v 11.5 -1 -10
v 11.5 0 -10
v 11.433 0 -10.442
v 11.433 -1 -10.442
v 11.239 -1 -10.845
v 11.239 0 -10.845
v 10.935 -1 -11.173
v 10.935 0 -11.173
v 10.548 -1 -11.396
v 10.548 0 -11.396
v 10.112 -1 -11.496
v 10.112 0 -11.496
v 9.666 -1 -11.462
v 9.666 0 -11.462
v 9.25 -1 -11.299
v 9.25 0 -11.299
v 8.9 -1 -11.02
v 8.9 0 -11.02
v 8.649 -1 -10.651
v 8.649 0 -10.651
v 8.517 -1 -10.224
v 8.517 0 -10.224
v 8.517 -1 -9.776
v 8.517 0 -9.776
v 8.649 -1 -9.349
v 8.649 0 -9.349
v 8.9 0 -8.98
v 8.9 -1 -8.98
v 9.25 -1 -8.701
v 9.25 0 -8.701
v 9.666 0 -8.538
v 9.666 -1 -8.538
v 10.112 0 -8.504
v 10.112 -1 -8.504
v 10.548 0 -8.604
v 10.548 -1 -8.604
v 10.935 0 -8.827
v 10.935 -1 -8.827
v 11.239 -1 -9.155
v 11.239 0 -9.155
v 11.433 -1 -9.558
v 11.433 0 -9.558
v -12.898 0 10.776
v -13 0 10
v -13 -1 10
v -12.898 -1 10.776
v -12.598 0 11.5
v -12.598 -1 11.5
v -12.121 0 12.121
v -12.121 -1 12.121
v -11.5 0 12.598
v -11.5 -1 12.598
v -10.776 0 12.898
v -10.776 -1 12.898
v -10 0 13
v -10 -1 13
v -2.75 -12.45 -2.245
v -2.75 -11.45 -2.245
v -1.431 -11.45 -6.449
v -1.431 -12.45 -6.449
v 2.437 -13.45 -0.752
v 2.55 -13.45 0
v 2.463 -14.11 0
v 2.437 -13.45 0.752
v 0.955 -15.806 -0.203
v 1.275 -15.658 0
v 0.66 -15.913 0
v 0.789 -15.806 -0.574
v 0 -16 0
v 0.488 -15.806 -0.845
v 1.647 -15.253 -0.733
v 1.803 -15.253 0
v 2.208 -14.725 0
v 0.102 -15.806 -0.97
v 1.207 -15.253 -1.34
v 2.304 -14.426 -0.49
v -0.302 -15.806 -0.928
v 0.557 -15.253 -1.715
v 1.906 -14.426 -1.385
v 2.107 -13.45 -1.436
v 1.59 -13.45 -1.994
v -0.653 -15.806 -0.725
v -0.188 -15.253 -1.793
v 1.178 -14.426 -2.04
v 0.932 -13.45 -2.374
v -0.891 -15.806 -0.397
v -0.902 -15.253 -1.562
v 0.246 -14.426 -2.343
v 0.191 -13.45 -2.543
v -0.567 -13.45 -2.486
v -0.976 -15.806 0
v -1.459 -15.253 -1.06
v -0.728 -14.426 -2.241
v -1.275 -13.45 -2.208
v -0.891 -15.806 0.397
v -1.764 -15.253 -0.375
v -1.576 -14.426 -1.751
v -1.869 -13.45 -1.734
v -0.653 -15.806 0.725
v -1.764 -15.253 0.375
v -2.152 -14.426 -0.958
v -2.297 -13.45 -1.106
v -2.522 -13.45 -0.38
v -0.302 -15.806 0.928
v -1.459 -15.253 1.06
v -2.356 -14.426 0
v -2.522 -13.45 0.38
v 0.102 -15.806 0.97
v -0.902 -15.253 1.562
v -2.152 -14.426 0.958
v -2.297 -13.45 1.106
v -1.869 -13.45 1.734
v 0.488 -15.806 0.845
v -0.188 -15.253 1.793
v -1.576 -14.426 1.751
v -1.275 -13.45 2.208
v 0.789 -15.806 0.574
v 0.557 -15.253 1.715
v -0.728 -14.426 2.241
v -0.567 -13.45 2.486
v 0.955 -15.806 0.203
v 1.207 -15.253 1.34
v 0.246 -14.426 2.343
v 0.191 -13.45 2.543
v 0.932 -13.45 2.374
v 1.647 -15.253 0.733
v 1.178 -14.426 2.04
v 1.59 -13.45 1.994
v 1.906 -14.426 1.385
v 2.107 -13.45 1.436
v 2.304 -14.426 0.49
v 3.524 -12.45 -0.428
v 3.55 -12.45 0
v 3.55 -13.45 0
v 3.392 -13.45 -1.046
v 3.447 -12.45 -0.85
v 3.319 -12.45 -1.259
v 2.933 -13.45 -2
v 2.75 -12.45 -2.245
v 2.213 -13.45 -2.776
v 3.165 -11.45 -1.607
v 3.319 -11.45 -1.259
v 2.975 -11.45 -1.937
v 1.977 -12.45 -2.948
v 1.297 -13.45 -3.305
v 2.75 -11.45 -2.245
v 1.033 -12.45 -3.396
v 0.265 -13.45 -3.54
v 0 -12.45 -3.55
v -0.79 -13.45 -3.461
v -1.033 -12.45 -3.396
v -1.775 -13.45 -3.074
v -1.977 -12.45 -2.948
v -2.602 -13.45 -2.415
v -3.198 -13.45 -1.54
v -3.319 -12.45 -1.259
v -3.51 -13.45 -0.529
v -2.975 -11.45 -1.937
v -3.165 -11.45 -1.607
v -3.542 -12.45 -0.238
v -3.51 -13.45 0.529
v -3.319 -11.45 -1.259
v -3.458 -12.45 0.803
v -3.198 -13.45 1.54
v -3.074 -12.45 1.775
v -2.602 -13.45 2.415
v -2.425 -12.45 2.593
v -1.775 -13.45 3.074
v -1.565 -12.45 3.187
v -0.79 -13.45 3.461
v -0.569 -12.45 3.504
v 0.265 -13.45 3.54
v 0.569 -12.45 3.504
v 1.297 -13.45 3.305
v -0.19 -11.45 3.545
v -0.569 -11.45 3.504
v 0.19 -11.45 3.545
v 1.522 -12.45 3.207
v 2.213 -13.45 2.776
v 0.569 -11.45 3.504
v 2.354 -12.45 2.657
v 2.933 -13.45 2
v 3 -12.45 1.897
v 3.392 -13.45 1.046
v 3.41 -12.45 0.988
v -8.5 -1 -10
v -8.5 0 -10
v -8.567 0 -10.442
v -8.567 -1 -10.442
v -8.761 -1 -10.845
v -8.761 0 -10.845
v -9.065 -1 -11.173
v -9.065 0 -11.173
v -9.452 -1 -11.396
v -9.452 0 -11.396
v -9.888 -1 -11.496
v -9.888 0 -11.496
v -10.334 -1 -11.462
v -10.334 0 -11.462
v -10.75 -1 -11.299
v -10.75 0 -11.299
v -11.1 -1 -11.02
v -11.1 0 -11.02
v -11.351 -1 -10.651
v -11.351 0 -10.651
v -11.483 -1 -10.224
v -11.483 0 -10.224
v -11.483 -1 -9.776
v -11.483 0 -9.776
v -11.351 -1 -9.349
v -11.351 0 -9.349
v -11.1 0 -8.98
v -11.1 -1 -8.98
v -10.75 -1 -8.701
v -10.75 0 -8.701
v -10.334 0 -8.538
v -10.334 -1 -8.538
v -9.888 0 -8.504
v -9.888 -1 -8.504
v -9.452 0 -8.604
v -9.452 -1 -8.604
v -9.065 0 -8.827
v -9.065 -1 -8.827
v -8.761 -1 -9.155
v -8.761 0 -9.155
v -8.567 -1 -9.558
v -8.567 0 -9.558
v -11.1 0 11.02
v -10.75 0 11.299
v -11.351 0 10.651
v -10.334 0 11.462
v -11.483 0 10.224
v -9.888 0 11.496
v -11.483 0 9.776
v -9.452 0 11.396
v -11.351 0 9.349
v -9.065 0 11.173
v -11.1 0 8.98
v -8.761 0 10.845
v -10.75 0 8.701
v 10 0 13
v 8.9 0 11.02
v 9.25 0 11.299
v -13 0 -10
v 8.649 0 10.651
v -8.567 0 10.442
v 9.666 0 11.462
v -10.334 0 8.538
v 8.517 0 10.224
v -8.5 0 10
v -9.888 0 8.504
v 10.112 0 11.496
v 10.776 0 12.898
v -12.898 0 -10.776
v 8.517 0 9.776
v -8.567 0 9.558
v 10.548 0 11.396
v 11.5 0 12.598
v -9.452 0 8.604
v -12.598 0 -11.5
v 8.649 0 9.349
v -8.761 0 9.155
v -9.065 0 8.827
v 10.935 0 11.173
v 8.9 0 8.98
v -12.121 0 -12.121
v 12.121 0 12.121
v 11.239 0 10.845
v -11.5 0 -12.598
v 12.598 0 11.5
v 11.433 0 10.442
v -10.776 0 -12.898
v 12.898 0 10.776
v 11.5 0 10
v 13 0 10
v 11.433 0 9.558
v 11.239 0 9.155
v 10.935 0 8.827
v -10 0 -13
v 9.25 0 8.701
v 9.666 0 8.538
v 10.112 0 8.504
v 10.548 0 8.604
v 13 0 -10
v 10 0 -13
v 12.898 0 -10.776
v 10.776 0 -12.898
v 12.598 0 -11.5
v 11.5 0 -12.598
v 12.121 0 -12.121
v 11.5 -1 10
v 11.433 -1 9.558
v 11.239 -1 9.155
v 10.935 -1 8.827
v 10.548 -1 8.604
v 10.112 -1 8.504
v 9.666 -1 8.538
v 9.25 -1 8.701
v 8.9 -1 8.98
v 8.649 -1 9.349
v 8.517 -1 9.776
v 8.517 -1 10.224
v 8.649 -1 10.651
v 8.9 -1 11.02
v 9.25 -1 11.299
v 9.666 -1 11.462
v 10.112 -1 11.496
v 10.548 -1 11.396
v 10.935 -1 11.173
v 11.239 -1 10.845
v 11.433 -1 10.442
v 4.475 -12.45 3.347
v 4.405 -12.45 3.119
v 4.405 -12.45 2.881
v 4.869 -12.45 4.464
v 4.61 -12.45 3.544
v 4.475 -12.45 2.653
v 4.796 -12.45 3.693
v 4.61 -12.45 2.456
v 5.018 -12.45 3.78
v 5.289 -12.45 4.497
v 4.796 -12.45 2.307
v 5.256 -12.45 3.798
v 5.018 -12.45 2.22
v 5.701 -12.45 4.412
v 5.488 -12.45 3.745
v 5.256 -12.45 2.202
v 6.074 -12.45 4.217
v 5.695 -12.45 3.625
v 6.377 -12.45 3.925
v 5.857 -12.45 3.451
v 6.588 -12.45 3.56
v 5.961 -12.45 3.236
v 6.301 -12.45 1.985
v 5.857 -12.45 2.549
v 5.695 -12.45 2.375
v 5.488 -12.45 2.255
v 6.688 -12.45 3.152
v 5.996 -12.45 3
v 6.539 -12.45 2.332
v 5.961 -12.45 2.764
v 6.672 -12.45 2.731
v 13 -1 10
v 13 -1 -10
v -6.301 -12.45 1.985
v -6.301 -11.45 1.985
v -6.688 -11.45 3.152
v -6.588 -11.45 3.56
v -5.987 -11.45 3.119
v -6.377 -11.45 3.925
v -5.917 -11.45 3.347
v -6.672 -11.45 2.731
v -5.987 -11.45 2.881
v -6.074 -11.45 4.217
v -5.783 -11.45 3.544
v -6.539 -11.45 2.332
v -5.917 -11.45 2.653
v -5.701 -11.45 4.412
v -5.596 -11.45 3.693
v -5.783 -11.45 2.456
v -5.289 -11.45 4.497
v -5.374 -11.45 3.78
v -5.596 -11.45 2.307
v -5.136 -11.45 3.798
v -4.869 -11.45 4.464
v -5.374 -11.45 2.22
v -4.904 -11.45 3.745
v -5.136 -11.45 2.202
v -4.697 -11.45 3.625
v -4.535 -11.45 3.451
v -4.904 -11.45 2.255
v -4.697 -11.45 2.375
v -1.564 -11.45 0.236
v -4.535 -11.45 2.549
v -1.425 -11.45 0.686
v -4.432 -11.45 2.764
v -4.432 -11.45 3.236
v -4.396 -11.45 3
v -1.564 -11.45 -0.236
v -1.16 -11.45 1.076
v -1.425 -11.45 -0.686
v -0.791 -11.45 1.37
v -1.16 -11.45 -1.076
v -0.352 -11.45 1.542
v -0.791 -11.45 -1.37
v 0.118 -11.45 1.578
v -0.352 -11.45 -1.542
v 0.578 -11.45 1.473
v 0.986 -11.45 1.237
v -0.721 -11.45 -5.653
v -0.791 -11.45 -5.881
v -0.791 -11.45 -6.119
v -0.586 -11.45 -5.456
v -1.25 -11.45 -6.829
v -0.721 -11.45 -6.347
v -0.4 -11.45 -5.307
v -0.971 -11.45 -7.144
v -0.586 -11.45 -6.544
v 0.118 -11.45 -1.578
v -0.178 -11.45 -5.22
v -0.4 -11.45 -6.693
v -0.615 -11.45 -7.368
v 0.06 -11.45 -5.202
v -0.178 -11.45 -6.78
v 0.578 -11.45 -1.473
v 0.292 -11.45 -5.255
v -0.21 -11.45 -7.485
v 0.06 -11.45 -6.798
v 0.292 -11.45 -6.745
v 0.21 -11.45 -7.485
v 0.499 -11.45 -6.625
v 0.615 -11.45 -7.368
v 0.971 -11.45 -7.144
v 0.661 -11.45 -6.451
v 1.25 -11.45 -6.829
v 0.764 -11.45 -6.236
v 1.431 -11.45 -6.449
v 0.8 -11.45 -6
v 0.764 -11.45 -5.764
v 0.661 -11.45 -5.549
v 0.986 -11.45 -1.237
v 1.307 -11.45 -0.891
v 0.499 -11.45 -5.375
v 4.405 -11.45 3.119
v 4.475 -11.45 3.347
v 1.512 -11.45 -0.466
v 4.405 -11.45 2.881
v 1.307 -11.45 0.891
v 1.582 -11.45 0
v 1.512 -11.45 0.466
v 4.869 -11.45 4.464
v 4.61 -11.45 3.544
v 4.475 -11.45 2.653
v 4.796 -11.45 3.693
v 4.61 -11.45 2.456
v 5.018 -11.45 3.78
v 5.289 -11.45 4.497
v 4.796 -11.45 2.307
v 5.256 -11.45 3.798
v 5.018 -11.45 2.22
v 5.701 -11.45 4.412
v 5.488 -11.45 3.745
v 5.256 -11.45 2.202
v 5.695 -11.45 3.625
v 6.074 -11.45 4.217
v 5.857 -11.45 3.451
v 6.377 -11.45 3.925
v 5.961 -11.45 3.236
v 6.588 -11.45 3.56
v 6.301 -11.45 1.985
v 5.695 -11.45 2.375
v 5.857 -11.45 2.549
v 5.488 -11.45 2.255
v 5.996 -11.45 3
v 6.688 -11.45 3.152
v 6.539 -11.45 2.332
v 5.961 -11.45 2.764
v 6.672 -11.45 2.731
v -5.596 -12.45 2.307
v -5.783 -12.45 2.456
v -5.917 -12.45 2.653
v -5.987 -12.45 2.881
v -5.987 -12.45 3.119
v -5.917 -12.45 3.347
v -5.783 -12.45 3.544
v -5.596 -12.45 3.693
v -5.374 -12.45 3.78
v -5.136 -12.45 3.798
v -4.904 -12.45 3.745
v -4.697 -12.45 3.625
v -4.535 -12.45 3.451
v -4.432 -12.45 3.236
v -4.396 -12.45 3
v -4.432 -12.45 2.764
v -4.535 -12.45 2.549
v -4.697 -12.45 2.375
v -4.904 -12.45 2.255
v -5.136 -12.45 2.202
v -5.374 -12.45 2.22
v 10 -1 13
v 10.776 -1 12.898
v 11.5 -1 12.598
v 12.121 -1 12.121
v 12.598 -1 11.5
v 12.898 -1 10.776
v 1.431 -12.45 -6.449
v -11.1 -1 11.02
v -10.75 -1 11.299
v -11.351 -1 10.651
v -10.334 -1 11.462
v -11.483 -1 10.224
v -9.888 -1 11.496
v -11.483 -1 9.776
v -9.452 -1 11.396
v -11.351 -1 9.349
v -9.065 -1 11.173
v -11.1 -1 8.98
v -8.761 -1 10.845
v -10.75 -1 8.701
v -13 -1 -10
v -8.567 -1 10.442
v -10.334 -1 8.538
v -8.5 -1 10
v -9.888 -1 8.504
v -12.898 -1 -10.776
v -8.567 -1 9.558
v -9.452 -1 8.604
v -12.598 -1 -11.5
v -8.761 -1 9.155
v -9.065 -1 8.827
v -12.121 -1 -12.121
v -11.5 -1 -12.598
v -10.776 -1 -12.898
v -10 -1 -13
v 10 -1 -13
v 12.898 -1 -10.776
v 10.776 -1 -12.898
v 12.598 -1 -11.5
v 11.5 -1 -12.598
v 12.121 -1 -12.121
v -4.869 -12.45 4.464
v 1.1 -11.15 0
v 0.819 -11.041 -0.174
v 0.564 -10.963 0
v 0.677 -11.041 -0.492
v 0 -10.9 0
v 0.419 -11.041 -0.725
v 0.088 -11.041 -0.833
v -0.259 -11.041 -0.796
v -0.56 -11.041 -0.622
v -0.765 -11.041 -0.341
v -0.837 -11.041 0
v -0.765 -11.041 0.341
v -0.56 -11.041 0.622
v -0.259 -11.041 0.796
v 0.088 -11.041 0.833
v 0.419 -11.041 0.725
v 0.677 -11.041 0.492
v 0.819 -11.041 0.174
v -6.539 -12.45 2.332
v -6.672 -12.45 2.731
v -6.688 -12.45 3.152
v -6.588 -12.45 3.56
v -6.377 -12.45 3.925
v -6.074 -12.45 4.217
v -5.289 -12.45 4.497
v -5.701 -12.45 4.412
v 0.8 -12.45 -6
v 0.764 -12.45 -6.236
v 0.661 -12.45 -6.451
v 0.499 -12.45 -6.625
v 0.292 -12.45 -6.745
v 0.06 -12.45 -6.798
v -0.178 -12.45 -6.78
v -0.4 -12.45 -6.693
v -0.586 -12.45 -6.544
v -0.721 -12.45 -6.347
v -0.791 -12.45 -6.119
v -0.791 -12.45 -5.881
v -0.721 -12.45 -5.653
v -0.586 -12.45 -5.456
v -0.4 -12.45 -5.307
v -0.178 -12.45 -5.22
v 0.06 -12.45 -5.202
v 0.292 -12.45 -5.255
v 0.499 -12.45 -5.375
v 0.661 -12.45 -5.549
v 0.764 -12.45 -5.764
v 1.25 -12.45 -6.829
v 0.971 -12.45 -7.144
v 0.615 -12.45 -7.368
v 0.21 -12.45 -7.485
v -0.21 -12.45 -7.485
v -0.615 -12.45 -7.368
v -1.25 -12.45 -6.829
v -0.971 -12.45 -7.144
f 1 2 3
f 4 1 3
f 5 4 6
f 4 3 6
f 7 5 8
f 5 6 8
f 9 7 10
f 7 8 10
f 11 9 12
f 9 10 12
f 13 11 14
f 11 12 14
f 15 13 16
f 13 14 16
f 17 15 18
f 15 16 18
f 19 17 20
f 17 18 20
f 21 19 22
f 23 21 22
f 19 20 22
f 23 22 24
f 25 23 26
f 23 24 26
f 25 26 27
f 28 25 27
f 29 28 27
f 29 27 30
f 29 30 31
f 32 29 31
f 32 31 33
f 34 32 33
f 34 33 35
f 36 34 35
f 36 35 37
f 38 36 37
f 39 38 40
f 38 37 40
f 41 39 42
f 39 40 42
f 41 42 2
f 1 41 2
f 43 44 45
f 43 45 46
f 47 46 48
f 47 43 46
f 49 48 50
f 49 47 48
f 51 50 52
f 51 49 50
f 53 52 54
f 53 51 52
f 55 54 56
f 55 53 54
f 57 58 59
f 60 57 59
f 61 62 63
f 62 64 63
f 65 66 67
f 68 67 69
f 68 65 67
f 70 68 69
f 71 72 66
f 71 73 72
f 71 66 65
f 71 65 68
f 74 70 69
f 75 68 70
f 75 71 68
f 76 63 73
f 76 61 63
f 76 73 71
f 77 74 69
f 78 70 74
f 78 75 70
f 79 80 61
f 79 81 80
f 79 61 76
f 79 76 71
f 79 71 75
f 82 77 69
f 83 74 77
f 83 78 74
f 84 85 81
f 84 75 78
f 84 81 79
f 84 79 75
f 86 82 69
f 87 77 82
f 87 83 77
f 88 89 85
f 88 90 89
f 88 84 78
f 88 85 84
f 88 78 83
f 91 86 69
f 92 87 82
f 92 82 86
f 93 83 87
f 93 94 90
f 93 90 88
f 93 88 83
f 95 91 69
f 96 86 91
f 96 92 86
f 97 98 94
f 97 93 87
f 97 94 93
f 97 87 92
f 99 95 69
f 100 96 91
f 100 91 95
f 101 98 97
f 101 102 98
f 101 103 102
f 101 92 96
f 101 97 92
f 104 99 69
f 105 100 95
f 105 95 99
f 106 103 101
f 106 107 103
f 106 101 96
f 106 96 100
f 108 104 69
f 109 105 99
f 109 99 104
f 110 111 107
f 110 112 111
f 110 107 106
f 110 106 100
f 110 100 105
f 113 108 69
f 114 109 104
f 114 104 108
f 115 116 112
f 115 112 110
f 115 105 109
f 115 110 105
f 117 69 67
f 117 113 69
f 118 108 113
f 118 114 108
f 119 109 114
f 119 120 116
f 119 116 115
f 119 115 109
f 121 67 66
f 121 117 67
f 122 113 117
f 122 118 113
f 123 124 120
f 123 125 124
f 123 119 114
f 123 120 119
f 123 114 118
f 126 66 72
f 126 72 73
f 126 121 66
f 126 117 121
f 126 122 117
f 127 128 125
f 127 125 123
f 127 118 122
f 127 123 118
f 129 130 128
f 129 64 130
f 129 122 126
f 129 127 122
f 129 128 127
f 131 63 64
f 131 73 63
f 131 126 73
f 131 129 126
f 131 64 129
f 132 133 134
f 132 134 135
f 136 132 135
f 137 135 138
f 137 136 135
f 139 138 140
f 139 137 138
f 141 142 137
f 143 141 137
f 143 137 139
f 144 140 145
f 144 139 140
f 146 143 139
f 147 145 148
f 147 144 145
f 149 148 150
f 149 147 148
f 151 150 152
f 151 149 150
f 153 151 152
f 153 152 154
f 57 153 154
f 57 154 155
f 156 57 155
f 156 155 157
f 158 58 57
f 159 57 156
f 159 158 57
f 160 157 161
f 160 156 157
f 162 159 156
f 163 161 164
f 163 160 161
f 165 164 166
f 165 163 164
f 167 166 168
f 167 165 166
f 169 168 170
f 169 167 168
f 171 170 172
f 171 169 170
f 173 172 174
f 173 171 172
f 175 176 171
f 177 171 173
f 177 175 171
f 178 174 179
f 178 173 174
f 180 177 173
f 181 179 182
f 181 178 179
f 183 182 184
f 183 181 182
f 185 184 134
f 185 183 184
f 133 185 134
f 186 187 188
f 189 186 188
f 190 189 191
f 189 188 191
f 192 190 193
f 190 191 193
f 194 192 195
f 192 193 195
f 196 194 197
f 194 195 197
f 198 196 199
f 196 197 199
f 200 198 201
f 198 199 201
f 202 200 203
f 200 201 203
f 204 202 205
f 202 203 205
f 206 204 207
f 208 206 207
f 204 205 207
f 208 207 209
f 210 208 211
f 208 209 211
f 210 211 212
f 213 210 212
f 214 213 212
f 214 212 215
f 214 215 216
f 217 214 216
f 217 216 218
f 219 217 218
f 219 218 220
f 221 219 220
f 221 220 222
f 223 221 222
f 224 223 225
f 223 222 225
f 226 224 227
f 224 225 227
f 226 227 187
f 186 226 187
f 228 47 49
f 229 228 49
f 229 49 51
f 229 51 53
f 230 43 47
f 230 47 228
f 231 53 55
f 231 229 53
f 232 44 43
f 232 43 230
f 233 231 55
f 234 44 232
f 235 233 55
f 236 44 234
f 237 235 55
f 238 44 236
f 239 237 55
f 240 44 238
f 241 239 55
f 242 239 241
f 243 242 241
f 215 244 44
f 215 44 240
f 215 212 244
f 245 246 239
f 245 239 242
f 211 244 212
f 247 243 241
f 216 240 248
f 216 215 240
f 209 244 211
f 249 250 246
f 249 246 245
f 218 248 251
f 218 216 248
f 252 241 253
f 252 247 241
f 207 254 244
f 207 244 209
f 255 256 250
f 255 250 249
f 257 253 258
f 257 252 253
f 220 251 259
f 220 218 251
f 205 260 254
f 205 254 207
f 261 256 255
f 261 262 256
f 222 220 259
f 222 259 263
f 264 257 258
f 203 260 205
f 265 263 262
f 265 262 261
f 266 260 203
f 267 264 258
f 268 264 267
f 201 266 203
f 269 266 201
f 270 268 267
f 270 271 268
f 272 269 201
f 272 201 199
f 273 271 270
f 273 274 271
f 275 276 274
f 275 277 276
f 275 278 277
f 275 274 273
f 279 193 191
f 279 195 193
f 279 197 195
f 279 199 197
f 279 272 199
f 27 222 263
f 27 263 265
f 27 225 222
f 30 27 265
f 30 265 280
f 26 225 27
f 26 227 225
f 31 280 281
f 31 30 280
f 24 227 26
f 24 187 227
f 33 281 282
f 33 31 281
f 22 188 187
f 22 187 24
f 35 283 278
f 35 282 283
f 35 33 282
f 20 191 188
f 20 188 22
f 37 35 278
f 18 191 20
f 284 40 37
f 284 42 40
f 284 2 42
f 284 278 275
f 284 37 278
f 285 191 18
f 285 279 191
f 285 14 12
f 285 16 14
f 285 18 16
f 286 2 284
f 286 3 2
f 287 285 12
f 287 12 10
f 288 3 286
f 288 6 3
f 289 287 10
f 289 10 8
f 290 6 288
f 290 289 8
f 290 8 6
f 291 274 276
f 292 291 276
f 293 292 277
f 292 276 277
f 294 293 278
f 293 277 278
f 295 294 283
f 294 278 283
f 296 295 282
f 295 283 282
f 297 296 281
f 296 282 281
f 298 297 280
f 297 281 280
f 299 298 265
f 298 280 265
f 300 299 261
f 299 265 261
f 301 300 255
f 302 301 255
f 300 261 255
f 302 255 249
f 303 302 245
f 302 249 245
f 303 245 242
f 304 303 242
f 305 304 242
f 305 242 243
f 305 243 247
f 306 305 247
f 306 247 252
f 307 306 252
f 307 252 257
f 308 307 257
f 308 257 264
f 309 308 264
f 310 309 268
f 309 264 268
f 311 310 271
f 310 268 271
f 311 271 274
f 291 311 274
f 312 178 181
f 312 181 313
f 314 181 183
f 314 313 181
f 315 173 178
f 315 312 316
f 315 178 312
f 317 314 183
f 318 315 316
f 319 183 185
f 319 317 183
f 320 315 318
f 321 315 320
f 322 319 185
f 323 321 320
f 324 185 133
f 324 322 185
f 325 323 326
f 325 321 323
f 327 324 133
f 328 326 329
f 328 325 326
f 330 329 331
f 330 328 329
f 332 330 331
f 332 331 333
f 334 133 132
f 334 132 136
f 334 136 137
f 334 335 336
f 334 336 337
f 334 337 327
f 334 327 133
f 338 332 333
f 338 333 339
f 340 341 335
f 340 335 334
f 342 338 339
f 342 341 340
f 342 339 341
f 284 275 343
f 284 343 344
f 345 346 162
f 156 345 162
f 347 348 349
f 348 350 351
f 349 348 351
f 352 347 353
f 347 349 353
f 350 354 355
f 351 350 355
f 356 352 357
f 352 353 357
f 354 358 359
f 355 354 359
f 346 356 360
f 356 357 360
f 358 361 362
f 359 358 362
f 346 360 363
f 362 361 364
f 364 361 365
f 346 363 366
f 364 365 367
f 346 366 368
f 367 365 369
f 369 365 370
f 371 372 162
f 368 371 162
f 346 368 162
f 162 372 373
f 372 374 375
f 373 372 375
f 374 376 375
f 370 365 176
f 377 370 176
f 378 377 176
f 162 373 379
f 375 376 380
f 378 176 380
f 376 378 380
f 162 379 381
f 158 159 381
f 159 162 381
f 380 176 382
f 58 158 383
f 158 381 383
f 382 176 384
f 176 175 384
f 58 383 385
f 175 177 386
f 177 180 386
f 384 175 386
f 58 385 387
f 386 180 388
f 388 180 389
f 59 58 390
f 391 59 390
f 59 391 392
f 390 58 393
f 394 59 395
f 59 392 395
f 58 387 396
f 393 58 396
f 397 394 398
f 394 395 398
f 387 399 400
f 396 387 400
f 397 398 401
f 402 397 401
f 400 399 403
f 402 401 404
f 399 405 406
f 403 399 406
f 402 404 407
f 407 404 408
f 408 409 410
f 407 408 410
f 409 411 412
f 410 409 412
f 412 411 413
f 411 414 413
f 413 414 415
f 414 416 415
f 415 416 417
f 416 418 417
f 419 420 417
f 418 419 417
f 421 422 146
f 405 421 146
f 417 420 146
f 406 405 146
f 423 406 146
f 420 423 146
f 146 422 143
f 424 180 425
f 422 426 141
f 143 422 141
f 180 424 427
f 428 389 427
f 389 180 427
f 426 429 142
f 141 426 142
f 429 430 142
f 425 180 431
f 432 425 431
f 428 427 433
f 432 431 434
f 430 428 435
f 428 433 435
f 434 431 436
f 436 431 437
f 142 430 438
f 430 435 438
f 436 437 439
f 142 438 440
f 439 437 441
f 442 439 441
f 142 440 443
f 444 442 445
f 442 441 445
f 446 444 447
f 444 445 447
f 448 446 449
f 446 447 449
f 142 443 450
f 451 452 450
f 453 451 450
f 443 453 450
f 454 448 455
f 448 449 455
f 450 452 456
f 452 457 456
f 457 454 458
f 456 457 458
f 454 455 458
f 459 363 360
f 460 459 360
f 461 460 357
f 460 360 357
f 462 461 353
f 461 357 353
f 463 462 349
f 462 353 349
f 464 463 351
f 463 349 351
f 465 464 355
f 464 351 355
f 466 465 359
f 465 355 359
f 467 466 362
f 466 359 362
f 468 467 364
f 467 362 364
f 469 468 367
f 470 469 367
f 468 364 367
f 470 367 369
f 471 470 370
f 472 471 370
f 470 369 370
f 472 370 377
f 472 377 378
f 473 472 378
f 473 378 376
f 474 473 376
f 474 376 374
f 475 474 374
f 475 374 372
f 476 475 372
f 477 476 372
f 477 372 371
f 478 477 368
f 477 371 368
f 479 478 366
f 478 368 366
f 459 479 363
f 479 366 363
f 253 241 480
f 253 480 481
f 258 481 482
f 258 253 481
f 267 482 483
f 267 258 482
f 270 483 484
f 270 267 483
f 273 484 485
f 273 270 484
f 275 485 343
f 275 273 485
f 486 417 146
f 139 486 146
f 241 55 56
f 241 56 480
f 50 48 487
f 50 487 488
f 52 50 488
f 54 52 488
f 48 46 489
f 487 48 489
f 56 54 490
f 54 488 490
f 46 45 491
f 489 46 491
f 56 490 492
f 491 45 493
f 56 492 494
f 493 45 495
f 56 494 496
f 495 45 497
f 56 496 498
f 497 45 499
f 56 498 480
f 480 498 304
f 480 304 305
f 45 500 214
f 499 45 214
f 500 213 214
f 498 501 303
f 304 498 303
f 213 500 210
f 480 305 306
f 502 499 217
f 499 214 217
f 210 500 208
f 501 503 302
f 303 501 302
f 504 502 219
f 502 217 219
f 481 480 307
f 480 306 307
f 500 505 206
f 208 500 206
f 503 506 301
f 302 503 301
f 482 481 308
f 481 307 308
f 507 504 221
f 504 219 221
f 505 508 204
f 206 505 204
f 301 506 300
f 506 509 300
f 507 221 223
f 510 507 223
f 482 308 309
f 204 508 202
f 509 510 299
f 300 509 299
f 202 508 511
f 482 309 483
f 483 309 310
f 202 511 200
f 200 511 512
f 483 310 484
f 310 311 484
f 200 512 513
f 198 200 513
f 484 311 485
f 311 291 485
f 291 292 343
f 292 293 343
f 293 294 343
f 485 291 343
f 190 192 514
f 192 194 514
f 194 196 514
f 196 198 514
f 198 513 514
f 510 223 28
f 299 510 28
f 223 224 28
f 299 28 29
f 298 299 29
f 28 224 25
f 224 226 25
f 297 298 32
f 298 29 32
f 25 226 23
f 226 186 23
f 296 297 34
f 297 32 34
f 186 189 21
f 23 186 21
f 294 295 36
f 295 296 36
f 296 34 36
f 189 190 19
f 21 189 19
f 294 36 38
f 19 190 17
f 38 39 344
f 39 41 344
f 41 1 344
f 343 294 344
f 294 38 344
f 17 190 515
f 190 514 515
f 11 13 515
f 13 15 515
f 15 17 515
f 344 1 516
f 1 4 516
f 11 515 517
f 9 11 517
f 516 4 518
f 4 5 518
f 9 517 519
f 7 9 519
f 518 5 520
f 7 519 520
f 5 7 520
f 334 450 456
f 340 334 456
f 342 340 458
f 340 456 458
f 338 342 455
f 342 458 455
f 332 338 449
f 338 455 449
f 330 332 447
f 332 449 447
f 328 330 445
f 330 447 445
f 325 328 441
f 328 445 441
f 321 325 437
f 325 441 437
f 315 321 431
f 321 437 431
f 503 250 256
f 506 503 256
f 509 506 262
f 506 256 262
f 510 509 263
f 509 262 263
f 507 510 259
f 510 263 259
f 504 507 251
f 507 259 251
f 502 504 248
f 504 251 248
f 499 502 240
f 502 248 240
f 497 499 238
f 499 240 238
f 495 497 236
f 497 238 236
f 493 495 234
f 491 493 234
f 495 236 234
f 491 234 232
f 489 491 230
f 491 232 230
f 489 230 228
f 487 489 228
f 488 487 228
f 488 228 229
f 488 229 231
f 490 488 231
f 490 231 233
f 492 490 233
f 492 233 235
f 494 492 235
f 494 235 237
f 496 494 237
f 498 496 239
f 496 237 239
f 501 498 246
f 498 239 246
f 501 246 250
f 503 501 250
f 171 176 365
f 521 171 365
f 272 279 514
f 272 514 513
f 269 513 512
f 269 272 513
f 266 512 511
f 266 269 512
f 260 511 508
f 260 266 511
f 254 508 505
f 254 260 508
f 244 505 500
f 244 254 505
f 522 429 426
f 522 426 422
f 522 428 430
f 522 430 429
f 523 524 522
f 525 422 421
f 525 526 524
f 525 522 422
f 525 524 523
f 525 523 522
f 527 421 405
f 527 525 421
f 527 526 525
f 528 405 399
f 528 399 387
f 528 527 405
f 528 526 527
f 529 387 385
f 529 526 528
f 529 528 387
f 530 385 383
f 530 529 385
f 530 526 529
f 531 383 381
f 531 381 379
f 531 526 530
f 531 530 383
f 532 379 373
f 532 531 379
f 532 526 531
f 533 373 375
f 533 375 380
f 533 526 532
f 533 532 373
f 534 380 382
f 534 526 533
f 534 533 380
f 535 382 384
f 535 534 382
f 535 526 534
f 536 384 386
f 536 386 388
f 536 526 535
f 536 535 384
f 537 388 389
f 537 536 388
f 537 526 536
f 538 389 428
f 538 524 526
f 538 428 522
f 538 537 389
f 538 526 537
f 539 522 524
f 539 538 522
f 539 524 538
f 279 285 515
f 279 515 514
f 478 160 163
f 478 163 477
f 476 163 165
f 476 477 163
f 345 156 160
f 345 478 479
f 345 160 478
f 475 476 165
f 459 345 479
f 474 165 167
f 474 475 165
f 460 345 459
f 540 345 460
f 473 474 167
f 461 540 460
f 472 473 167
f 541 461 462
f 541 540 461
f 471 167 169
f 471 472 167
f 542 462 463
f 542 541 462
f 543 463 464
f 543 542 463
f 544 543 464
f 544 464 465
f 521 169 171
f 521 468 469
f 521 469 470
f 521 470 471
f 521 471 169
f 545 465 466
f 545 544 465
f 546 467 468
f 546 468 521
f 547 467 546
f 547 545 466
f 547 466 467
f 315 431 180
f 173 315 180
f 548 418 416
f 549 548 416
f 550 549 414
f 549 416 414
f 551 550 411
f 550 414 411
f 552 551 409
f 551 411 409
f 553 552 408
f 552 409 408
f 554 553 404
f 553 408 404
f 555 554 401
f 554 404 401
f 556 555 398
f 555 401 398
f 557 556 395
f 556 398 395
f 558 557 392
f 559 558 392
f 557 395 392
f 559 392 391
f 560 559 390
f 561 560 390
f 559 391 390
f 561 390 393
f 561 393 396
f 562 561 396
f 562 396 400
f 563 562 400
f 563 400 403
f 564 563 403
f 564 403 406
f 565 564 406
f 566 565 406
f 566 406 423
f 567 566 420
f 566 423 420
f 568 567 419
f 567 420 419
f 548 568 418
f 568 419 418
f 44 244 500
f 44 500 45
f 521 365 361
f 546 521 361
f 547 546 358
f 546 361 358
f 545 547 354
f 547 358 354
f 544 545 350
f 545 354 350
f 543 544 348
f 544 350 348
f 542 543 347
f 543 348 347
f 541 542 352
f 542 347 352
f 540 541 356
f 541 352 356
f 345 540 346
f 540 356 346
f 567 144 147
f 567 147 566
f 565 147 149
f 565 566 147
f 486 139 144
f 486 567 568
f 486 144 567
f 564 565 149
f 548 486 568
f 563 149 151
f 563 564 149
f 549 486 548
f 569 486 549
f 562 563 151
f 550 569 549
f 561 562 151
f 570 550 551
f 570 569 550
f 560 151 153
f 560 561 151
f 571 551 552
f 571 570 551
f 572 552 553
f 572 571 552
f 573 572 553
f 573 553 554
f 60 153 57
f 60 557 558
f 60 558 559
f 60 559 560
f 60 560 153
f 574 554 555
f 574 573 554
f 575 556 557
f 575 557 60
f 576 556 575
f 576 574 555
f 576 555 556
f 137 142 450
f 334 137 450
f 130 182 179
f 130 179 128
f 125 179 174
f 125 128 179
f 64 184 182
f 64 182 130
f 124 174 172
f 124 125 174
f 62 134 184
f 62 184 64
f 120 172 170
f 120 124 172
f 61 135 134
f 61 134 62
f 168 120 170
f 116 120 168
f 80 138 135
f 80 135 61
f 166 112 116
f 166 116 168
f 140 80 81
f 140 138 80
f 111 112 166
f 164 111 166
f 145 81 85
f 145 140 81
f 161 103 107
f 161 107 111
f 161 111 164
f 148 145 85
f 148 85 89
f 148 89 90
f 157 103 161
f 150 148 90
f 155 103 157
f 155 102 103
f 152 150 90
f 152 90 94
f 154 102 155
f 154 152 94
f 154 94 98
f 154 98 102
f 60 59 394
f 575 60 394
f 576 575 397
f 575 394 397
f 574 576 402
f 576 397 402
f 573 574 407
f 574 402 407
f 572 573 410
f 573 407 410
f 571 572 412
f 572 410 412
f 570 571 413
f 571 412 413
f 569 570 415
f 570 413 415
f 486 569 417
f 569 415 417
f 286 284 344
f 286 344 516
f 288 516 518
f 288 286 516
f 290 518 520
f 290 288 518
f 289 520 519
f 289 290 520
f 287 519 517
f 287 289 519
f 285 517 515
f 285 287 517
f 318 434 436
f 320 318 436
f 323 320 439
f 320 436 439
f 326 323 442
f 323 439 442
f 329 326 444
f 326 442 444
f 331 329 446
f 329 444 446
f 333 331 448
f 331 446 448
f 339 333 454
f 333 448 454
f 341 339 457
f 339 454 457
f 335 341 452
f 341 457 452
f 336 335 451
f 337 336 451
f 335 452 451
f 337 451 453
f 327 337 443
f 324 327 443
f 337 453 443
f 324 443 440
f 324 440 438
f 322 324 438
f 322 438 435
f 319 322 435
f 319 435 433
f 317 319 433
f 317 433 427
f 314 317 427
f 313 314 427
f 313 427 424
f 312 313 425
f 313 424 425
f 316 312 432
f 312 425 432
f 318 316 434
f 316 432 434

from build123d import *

# Parameters (mm, degrees)
SKETCH1_R           = 1.5
BOSS_EXTRUDE1_DEPTH = 1
SKETCH5_R           = 0.8
BOSS_EXTRUDE2_DEPTH = 1
CIRPATTERN3_COUNT   = 3


with BuildPart() as part:
    # Sketch1 → Boss-Extrude1 (new body)
    with BuildSketch(Plane(origin=(0, 0, 0), x_dir=(1, 0, 0), z_dir=(0, 1, 0))):
        with BuildLine():
            Line((-10, -13), (10, -13))
            ThreePointArc((10, -13), (12.121320344, -12.121320344), (13, -10))
            Line((13, -10), (13, 10))
            ThreePointArc((13, 10), (12.121320344, 12.121320344), (10, 13))
            Line((10, 13), (-10, 13))
            ThreePointArc((-10, 13), (-12.121320344, 12.121320344), (-13, 10))
            Line((-13, 10), (-13, -10))
            ThreePointArc((-13, -10), (-12.121320344, -12.121320344), (-10, -13))
        make_face()
        with Locations((-10, 10)):
            Circle(SKETCH1_R, mode=Mode.SUBTRACT)
        with Locations((10, 10)):
            Circle(SKETCH1_R, mode=Mode.SUBTRACT)
        with Locations((-10, -10)):
            Circle(SKETCH1_R, mode=Mode.SUBTRACT)
        with Locations((10, -10)):
            Circle(SKETCH1_R, mode=Mode.SUBTRACT)
    extrude(amount=-BOSS_EXTRUDE1_DEPTH)


with BuildPart() as body_2:
    # Sketch2 → Revolve2 (revolve)
    with BuildSketch(Plane.XY):
        with BuildLine():
            Line((0, -10.9), (0, -16))
            ThreePointArc((0, -16), (2.55, -13.45), (0, -10.9))
        make_face()
    revolve(axis=Axis((0, -13.45, 0), (0, 1, 0)))

    # Sketch4 → Revolve3 (revolve)
    with BuildSketch(Plane.XY):
        with BuildLine():
            Line((2.55, -13.45), (3.55, -13.45))
            Line((3.55, -13.45), (3.55, -11.45))
            Line((3.55, -11.45), (1.581929202, -11.45))
            ThreePointArc((1.581929202, -11.45), (2.295258097, -12.339013831), (2.55, -13.45))
        make_face()
    revolve(axis=Axis((0, -13.45, 0), (0, 1, 0)))

    # Sketch5 → Boss-Extrude2 (add)
    with BuildSketch(Plane(origin=(0, -11.45, 0), x_dir=(1, 0, 0), z_dir=(0, 1, 0))):
        with BuildLine():
            Line((-2.75, 2.244994432), (-1.431232042, 6.44897087))
            ThreePointArc((-1.431232042, 6.44897087), (0, 7.5), (1.431232042, 6.44897087))
            Line((1.431232042, 6.44897087), (2.75, 2.244994432))
            ThreePointArc((2.75, 2.244994432), (0, 3.55), (-2.75, 2.244994432))
        make_face()
        with Locations((0, 6)):
            Circle(SKETCH5_R, mode=Mode.SUBTRACT)
    boss_extrude2 = extrude(amount=-BOSS_EXTRUDE2_DEPTH)

    # CirPattern3: Boss-Extrude2 ×3 about axis
    cirpattern3_axis = Axis((0, 0, 0), (0, 1, 0))
    for i in range(1, CIRPATTERN3_COUNT):
        add(boss_extrude2.rotate(cirpattern3_axis, i * 360 / CIRPATTERN3_COUNT))


solid = Compound([part.part, body_2.part])
